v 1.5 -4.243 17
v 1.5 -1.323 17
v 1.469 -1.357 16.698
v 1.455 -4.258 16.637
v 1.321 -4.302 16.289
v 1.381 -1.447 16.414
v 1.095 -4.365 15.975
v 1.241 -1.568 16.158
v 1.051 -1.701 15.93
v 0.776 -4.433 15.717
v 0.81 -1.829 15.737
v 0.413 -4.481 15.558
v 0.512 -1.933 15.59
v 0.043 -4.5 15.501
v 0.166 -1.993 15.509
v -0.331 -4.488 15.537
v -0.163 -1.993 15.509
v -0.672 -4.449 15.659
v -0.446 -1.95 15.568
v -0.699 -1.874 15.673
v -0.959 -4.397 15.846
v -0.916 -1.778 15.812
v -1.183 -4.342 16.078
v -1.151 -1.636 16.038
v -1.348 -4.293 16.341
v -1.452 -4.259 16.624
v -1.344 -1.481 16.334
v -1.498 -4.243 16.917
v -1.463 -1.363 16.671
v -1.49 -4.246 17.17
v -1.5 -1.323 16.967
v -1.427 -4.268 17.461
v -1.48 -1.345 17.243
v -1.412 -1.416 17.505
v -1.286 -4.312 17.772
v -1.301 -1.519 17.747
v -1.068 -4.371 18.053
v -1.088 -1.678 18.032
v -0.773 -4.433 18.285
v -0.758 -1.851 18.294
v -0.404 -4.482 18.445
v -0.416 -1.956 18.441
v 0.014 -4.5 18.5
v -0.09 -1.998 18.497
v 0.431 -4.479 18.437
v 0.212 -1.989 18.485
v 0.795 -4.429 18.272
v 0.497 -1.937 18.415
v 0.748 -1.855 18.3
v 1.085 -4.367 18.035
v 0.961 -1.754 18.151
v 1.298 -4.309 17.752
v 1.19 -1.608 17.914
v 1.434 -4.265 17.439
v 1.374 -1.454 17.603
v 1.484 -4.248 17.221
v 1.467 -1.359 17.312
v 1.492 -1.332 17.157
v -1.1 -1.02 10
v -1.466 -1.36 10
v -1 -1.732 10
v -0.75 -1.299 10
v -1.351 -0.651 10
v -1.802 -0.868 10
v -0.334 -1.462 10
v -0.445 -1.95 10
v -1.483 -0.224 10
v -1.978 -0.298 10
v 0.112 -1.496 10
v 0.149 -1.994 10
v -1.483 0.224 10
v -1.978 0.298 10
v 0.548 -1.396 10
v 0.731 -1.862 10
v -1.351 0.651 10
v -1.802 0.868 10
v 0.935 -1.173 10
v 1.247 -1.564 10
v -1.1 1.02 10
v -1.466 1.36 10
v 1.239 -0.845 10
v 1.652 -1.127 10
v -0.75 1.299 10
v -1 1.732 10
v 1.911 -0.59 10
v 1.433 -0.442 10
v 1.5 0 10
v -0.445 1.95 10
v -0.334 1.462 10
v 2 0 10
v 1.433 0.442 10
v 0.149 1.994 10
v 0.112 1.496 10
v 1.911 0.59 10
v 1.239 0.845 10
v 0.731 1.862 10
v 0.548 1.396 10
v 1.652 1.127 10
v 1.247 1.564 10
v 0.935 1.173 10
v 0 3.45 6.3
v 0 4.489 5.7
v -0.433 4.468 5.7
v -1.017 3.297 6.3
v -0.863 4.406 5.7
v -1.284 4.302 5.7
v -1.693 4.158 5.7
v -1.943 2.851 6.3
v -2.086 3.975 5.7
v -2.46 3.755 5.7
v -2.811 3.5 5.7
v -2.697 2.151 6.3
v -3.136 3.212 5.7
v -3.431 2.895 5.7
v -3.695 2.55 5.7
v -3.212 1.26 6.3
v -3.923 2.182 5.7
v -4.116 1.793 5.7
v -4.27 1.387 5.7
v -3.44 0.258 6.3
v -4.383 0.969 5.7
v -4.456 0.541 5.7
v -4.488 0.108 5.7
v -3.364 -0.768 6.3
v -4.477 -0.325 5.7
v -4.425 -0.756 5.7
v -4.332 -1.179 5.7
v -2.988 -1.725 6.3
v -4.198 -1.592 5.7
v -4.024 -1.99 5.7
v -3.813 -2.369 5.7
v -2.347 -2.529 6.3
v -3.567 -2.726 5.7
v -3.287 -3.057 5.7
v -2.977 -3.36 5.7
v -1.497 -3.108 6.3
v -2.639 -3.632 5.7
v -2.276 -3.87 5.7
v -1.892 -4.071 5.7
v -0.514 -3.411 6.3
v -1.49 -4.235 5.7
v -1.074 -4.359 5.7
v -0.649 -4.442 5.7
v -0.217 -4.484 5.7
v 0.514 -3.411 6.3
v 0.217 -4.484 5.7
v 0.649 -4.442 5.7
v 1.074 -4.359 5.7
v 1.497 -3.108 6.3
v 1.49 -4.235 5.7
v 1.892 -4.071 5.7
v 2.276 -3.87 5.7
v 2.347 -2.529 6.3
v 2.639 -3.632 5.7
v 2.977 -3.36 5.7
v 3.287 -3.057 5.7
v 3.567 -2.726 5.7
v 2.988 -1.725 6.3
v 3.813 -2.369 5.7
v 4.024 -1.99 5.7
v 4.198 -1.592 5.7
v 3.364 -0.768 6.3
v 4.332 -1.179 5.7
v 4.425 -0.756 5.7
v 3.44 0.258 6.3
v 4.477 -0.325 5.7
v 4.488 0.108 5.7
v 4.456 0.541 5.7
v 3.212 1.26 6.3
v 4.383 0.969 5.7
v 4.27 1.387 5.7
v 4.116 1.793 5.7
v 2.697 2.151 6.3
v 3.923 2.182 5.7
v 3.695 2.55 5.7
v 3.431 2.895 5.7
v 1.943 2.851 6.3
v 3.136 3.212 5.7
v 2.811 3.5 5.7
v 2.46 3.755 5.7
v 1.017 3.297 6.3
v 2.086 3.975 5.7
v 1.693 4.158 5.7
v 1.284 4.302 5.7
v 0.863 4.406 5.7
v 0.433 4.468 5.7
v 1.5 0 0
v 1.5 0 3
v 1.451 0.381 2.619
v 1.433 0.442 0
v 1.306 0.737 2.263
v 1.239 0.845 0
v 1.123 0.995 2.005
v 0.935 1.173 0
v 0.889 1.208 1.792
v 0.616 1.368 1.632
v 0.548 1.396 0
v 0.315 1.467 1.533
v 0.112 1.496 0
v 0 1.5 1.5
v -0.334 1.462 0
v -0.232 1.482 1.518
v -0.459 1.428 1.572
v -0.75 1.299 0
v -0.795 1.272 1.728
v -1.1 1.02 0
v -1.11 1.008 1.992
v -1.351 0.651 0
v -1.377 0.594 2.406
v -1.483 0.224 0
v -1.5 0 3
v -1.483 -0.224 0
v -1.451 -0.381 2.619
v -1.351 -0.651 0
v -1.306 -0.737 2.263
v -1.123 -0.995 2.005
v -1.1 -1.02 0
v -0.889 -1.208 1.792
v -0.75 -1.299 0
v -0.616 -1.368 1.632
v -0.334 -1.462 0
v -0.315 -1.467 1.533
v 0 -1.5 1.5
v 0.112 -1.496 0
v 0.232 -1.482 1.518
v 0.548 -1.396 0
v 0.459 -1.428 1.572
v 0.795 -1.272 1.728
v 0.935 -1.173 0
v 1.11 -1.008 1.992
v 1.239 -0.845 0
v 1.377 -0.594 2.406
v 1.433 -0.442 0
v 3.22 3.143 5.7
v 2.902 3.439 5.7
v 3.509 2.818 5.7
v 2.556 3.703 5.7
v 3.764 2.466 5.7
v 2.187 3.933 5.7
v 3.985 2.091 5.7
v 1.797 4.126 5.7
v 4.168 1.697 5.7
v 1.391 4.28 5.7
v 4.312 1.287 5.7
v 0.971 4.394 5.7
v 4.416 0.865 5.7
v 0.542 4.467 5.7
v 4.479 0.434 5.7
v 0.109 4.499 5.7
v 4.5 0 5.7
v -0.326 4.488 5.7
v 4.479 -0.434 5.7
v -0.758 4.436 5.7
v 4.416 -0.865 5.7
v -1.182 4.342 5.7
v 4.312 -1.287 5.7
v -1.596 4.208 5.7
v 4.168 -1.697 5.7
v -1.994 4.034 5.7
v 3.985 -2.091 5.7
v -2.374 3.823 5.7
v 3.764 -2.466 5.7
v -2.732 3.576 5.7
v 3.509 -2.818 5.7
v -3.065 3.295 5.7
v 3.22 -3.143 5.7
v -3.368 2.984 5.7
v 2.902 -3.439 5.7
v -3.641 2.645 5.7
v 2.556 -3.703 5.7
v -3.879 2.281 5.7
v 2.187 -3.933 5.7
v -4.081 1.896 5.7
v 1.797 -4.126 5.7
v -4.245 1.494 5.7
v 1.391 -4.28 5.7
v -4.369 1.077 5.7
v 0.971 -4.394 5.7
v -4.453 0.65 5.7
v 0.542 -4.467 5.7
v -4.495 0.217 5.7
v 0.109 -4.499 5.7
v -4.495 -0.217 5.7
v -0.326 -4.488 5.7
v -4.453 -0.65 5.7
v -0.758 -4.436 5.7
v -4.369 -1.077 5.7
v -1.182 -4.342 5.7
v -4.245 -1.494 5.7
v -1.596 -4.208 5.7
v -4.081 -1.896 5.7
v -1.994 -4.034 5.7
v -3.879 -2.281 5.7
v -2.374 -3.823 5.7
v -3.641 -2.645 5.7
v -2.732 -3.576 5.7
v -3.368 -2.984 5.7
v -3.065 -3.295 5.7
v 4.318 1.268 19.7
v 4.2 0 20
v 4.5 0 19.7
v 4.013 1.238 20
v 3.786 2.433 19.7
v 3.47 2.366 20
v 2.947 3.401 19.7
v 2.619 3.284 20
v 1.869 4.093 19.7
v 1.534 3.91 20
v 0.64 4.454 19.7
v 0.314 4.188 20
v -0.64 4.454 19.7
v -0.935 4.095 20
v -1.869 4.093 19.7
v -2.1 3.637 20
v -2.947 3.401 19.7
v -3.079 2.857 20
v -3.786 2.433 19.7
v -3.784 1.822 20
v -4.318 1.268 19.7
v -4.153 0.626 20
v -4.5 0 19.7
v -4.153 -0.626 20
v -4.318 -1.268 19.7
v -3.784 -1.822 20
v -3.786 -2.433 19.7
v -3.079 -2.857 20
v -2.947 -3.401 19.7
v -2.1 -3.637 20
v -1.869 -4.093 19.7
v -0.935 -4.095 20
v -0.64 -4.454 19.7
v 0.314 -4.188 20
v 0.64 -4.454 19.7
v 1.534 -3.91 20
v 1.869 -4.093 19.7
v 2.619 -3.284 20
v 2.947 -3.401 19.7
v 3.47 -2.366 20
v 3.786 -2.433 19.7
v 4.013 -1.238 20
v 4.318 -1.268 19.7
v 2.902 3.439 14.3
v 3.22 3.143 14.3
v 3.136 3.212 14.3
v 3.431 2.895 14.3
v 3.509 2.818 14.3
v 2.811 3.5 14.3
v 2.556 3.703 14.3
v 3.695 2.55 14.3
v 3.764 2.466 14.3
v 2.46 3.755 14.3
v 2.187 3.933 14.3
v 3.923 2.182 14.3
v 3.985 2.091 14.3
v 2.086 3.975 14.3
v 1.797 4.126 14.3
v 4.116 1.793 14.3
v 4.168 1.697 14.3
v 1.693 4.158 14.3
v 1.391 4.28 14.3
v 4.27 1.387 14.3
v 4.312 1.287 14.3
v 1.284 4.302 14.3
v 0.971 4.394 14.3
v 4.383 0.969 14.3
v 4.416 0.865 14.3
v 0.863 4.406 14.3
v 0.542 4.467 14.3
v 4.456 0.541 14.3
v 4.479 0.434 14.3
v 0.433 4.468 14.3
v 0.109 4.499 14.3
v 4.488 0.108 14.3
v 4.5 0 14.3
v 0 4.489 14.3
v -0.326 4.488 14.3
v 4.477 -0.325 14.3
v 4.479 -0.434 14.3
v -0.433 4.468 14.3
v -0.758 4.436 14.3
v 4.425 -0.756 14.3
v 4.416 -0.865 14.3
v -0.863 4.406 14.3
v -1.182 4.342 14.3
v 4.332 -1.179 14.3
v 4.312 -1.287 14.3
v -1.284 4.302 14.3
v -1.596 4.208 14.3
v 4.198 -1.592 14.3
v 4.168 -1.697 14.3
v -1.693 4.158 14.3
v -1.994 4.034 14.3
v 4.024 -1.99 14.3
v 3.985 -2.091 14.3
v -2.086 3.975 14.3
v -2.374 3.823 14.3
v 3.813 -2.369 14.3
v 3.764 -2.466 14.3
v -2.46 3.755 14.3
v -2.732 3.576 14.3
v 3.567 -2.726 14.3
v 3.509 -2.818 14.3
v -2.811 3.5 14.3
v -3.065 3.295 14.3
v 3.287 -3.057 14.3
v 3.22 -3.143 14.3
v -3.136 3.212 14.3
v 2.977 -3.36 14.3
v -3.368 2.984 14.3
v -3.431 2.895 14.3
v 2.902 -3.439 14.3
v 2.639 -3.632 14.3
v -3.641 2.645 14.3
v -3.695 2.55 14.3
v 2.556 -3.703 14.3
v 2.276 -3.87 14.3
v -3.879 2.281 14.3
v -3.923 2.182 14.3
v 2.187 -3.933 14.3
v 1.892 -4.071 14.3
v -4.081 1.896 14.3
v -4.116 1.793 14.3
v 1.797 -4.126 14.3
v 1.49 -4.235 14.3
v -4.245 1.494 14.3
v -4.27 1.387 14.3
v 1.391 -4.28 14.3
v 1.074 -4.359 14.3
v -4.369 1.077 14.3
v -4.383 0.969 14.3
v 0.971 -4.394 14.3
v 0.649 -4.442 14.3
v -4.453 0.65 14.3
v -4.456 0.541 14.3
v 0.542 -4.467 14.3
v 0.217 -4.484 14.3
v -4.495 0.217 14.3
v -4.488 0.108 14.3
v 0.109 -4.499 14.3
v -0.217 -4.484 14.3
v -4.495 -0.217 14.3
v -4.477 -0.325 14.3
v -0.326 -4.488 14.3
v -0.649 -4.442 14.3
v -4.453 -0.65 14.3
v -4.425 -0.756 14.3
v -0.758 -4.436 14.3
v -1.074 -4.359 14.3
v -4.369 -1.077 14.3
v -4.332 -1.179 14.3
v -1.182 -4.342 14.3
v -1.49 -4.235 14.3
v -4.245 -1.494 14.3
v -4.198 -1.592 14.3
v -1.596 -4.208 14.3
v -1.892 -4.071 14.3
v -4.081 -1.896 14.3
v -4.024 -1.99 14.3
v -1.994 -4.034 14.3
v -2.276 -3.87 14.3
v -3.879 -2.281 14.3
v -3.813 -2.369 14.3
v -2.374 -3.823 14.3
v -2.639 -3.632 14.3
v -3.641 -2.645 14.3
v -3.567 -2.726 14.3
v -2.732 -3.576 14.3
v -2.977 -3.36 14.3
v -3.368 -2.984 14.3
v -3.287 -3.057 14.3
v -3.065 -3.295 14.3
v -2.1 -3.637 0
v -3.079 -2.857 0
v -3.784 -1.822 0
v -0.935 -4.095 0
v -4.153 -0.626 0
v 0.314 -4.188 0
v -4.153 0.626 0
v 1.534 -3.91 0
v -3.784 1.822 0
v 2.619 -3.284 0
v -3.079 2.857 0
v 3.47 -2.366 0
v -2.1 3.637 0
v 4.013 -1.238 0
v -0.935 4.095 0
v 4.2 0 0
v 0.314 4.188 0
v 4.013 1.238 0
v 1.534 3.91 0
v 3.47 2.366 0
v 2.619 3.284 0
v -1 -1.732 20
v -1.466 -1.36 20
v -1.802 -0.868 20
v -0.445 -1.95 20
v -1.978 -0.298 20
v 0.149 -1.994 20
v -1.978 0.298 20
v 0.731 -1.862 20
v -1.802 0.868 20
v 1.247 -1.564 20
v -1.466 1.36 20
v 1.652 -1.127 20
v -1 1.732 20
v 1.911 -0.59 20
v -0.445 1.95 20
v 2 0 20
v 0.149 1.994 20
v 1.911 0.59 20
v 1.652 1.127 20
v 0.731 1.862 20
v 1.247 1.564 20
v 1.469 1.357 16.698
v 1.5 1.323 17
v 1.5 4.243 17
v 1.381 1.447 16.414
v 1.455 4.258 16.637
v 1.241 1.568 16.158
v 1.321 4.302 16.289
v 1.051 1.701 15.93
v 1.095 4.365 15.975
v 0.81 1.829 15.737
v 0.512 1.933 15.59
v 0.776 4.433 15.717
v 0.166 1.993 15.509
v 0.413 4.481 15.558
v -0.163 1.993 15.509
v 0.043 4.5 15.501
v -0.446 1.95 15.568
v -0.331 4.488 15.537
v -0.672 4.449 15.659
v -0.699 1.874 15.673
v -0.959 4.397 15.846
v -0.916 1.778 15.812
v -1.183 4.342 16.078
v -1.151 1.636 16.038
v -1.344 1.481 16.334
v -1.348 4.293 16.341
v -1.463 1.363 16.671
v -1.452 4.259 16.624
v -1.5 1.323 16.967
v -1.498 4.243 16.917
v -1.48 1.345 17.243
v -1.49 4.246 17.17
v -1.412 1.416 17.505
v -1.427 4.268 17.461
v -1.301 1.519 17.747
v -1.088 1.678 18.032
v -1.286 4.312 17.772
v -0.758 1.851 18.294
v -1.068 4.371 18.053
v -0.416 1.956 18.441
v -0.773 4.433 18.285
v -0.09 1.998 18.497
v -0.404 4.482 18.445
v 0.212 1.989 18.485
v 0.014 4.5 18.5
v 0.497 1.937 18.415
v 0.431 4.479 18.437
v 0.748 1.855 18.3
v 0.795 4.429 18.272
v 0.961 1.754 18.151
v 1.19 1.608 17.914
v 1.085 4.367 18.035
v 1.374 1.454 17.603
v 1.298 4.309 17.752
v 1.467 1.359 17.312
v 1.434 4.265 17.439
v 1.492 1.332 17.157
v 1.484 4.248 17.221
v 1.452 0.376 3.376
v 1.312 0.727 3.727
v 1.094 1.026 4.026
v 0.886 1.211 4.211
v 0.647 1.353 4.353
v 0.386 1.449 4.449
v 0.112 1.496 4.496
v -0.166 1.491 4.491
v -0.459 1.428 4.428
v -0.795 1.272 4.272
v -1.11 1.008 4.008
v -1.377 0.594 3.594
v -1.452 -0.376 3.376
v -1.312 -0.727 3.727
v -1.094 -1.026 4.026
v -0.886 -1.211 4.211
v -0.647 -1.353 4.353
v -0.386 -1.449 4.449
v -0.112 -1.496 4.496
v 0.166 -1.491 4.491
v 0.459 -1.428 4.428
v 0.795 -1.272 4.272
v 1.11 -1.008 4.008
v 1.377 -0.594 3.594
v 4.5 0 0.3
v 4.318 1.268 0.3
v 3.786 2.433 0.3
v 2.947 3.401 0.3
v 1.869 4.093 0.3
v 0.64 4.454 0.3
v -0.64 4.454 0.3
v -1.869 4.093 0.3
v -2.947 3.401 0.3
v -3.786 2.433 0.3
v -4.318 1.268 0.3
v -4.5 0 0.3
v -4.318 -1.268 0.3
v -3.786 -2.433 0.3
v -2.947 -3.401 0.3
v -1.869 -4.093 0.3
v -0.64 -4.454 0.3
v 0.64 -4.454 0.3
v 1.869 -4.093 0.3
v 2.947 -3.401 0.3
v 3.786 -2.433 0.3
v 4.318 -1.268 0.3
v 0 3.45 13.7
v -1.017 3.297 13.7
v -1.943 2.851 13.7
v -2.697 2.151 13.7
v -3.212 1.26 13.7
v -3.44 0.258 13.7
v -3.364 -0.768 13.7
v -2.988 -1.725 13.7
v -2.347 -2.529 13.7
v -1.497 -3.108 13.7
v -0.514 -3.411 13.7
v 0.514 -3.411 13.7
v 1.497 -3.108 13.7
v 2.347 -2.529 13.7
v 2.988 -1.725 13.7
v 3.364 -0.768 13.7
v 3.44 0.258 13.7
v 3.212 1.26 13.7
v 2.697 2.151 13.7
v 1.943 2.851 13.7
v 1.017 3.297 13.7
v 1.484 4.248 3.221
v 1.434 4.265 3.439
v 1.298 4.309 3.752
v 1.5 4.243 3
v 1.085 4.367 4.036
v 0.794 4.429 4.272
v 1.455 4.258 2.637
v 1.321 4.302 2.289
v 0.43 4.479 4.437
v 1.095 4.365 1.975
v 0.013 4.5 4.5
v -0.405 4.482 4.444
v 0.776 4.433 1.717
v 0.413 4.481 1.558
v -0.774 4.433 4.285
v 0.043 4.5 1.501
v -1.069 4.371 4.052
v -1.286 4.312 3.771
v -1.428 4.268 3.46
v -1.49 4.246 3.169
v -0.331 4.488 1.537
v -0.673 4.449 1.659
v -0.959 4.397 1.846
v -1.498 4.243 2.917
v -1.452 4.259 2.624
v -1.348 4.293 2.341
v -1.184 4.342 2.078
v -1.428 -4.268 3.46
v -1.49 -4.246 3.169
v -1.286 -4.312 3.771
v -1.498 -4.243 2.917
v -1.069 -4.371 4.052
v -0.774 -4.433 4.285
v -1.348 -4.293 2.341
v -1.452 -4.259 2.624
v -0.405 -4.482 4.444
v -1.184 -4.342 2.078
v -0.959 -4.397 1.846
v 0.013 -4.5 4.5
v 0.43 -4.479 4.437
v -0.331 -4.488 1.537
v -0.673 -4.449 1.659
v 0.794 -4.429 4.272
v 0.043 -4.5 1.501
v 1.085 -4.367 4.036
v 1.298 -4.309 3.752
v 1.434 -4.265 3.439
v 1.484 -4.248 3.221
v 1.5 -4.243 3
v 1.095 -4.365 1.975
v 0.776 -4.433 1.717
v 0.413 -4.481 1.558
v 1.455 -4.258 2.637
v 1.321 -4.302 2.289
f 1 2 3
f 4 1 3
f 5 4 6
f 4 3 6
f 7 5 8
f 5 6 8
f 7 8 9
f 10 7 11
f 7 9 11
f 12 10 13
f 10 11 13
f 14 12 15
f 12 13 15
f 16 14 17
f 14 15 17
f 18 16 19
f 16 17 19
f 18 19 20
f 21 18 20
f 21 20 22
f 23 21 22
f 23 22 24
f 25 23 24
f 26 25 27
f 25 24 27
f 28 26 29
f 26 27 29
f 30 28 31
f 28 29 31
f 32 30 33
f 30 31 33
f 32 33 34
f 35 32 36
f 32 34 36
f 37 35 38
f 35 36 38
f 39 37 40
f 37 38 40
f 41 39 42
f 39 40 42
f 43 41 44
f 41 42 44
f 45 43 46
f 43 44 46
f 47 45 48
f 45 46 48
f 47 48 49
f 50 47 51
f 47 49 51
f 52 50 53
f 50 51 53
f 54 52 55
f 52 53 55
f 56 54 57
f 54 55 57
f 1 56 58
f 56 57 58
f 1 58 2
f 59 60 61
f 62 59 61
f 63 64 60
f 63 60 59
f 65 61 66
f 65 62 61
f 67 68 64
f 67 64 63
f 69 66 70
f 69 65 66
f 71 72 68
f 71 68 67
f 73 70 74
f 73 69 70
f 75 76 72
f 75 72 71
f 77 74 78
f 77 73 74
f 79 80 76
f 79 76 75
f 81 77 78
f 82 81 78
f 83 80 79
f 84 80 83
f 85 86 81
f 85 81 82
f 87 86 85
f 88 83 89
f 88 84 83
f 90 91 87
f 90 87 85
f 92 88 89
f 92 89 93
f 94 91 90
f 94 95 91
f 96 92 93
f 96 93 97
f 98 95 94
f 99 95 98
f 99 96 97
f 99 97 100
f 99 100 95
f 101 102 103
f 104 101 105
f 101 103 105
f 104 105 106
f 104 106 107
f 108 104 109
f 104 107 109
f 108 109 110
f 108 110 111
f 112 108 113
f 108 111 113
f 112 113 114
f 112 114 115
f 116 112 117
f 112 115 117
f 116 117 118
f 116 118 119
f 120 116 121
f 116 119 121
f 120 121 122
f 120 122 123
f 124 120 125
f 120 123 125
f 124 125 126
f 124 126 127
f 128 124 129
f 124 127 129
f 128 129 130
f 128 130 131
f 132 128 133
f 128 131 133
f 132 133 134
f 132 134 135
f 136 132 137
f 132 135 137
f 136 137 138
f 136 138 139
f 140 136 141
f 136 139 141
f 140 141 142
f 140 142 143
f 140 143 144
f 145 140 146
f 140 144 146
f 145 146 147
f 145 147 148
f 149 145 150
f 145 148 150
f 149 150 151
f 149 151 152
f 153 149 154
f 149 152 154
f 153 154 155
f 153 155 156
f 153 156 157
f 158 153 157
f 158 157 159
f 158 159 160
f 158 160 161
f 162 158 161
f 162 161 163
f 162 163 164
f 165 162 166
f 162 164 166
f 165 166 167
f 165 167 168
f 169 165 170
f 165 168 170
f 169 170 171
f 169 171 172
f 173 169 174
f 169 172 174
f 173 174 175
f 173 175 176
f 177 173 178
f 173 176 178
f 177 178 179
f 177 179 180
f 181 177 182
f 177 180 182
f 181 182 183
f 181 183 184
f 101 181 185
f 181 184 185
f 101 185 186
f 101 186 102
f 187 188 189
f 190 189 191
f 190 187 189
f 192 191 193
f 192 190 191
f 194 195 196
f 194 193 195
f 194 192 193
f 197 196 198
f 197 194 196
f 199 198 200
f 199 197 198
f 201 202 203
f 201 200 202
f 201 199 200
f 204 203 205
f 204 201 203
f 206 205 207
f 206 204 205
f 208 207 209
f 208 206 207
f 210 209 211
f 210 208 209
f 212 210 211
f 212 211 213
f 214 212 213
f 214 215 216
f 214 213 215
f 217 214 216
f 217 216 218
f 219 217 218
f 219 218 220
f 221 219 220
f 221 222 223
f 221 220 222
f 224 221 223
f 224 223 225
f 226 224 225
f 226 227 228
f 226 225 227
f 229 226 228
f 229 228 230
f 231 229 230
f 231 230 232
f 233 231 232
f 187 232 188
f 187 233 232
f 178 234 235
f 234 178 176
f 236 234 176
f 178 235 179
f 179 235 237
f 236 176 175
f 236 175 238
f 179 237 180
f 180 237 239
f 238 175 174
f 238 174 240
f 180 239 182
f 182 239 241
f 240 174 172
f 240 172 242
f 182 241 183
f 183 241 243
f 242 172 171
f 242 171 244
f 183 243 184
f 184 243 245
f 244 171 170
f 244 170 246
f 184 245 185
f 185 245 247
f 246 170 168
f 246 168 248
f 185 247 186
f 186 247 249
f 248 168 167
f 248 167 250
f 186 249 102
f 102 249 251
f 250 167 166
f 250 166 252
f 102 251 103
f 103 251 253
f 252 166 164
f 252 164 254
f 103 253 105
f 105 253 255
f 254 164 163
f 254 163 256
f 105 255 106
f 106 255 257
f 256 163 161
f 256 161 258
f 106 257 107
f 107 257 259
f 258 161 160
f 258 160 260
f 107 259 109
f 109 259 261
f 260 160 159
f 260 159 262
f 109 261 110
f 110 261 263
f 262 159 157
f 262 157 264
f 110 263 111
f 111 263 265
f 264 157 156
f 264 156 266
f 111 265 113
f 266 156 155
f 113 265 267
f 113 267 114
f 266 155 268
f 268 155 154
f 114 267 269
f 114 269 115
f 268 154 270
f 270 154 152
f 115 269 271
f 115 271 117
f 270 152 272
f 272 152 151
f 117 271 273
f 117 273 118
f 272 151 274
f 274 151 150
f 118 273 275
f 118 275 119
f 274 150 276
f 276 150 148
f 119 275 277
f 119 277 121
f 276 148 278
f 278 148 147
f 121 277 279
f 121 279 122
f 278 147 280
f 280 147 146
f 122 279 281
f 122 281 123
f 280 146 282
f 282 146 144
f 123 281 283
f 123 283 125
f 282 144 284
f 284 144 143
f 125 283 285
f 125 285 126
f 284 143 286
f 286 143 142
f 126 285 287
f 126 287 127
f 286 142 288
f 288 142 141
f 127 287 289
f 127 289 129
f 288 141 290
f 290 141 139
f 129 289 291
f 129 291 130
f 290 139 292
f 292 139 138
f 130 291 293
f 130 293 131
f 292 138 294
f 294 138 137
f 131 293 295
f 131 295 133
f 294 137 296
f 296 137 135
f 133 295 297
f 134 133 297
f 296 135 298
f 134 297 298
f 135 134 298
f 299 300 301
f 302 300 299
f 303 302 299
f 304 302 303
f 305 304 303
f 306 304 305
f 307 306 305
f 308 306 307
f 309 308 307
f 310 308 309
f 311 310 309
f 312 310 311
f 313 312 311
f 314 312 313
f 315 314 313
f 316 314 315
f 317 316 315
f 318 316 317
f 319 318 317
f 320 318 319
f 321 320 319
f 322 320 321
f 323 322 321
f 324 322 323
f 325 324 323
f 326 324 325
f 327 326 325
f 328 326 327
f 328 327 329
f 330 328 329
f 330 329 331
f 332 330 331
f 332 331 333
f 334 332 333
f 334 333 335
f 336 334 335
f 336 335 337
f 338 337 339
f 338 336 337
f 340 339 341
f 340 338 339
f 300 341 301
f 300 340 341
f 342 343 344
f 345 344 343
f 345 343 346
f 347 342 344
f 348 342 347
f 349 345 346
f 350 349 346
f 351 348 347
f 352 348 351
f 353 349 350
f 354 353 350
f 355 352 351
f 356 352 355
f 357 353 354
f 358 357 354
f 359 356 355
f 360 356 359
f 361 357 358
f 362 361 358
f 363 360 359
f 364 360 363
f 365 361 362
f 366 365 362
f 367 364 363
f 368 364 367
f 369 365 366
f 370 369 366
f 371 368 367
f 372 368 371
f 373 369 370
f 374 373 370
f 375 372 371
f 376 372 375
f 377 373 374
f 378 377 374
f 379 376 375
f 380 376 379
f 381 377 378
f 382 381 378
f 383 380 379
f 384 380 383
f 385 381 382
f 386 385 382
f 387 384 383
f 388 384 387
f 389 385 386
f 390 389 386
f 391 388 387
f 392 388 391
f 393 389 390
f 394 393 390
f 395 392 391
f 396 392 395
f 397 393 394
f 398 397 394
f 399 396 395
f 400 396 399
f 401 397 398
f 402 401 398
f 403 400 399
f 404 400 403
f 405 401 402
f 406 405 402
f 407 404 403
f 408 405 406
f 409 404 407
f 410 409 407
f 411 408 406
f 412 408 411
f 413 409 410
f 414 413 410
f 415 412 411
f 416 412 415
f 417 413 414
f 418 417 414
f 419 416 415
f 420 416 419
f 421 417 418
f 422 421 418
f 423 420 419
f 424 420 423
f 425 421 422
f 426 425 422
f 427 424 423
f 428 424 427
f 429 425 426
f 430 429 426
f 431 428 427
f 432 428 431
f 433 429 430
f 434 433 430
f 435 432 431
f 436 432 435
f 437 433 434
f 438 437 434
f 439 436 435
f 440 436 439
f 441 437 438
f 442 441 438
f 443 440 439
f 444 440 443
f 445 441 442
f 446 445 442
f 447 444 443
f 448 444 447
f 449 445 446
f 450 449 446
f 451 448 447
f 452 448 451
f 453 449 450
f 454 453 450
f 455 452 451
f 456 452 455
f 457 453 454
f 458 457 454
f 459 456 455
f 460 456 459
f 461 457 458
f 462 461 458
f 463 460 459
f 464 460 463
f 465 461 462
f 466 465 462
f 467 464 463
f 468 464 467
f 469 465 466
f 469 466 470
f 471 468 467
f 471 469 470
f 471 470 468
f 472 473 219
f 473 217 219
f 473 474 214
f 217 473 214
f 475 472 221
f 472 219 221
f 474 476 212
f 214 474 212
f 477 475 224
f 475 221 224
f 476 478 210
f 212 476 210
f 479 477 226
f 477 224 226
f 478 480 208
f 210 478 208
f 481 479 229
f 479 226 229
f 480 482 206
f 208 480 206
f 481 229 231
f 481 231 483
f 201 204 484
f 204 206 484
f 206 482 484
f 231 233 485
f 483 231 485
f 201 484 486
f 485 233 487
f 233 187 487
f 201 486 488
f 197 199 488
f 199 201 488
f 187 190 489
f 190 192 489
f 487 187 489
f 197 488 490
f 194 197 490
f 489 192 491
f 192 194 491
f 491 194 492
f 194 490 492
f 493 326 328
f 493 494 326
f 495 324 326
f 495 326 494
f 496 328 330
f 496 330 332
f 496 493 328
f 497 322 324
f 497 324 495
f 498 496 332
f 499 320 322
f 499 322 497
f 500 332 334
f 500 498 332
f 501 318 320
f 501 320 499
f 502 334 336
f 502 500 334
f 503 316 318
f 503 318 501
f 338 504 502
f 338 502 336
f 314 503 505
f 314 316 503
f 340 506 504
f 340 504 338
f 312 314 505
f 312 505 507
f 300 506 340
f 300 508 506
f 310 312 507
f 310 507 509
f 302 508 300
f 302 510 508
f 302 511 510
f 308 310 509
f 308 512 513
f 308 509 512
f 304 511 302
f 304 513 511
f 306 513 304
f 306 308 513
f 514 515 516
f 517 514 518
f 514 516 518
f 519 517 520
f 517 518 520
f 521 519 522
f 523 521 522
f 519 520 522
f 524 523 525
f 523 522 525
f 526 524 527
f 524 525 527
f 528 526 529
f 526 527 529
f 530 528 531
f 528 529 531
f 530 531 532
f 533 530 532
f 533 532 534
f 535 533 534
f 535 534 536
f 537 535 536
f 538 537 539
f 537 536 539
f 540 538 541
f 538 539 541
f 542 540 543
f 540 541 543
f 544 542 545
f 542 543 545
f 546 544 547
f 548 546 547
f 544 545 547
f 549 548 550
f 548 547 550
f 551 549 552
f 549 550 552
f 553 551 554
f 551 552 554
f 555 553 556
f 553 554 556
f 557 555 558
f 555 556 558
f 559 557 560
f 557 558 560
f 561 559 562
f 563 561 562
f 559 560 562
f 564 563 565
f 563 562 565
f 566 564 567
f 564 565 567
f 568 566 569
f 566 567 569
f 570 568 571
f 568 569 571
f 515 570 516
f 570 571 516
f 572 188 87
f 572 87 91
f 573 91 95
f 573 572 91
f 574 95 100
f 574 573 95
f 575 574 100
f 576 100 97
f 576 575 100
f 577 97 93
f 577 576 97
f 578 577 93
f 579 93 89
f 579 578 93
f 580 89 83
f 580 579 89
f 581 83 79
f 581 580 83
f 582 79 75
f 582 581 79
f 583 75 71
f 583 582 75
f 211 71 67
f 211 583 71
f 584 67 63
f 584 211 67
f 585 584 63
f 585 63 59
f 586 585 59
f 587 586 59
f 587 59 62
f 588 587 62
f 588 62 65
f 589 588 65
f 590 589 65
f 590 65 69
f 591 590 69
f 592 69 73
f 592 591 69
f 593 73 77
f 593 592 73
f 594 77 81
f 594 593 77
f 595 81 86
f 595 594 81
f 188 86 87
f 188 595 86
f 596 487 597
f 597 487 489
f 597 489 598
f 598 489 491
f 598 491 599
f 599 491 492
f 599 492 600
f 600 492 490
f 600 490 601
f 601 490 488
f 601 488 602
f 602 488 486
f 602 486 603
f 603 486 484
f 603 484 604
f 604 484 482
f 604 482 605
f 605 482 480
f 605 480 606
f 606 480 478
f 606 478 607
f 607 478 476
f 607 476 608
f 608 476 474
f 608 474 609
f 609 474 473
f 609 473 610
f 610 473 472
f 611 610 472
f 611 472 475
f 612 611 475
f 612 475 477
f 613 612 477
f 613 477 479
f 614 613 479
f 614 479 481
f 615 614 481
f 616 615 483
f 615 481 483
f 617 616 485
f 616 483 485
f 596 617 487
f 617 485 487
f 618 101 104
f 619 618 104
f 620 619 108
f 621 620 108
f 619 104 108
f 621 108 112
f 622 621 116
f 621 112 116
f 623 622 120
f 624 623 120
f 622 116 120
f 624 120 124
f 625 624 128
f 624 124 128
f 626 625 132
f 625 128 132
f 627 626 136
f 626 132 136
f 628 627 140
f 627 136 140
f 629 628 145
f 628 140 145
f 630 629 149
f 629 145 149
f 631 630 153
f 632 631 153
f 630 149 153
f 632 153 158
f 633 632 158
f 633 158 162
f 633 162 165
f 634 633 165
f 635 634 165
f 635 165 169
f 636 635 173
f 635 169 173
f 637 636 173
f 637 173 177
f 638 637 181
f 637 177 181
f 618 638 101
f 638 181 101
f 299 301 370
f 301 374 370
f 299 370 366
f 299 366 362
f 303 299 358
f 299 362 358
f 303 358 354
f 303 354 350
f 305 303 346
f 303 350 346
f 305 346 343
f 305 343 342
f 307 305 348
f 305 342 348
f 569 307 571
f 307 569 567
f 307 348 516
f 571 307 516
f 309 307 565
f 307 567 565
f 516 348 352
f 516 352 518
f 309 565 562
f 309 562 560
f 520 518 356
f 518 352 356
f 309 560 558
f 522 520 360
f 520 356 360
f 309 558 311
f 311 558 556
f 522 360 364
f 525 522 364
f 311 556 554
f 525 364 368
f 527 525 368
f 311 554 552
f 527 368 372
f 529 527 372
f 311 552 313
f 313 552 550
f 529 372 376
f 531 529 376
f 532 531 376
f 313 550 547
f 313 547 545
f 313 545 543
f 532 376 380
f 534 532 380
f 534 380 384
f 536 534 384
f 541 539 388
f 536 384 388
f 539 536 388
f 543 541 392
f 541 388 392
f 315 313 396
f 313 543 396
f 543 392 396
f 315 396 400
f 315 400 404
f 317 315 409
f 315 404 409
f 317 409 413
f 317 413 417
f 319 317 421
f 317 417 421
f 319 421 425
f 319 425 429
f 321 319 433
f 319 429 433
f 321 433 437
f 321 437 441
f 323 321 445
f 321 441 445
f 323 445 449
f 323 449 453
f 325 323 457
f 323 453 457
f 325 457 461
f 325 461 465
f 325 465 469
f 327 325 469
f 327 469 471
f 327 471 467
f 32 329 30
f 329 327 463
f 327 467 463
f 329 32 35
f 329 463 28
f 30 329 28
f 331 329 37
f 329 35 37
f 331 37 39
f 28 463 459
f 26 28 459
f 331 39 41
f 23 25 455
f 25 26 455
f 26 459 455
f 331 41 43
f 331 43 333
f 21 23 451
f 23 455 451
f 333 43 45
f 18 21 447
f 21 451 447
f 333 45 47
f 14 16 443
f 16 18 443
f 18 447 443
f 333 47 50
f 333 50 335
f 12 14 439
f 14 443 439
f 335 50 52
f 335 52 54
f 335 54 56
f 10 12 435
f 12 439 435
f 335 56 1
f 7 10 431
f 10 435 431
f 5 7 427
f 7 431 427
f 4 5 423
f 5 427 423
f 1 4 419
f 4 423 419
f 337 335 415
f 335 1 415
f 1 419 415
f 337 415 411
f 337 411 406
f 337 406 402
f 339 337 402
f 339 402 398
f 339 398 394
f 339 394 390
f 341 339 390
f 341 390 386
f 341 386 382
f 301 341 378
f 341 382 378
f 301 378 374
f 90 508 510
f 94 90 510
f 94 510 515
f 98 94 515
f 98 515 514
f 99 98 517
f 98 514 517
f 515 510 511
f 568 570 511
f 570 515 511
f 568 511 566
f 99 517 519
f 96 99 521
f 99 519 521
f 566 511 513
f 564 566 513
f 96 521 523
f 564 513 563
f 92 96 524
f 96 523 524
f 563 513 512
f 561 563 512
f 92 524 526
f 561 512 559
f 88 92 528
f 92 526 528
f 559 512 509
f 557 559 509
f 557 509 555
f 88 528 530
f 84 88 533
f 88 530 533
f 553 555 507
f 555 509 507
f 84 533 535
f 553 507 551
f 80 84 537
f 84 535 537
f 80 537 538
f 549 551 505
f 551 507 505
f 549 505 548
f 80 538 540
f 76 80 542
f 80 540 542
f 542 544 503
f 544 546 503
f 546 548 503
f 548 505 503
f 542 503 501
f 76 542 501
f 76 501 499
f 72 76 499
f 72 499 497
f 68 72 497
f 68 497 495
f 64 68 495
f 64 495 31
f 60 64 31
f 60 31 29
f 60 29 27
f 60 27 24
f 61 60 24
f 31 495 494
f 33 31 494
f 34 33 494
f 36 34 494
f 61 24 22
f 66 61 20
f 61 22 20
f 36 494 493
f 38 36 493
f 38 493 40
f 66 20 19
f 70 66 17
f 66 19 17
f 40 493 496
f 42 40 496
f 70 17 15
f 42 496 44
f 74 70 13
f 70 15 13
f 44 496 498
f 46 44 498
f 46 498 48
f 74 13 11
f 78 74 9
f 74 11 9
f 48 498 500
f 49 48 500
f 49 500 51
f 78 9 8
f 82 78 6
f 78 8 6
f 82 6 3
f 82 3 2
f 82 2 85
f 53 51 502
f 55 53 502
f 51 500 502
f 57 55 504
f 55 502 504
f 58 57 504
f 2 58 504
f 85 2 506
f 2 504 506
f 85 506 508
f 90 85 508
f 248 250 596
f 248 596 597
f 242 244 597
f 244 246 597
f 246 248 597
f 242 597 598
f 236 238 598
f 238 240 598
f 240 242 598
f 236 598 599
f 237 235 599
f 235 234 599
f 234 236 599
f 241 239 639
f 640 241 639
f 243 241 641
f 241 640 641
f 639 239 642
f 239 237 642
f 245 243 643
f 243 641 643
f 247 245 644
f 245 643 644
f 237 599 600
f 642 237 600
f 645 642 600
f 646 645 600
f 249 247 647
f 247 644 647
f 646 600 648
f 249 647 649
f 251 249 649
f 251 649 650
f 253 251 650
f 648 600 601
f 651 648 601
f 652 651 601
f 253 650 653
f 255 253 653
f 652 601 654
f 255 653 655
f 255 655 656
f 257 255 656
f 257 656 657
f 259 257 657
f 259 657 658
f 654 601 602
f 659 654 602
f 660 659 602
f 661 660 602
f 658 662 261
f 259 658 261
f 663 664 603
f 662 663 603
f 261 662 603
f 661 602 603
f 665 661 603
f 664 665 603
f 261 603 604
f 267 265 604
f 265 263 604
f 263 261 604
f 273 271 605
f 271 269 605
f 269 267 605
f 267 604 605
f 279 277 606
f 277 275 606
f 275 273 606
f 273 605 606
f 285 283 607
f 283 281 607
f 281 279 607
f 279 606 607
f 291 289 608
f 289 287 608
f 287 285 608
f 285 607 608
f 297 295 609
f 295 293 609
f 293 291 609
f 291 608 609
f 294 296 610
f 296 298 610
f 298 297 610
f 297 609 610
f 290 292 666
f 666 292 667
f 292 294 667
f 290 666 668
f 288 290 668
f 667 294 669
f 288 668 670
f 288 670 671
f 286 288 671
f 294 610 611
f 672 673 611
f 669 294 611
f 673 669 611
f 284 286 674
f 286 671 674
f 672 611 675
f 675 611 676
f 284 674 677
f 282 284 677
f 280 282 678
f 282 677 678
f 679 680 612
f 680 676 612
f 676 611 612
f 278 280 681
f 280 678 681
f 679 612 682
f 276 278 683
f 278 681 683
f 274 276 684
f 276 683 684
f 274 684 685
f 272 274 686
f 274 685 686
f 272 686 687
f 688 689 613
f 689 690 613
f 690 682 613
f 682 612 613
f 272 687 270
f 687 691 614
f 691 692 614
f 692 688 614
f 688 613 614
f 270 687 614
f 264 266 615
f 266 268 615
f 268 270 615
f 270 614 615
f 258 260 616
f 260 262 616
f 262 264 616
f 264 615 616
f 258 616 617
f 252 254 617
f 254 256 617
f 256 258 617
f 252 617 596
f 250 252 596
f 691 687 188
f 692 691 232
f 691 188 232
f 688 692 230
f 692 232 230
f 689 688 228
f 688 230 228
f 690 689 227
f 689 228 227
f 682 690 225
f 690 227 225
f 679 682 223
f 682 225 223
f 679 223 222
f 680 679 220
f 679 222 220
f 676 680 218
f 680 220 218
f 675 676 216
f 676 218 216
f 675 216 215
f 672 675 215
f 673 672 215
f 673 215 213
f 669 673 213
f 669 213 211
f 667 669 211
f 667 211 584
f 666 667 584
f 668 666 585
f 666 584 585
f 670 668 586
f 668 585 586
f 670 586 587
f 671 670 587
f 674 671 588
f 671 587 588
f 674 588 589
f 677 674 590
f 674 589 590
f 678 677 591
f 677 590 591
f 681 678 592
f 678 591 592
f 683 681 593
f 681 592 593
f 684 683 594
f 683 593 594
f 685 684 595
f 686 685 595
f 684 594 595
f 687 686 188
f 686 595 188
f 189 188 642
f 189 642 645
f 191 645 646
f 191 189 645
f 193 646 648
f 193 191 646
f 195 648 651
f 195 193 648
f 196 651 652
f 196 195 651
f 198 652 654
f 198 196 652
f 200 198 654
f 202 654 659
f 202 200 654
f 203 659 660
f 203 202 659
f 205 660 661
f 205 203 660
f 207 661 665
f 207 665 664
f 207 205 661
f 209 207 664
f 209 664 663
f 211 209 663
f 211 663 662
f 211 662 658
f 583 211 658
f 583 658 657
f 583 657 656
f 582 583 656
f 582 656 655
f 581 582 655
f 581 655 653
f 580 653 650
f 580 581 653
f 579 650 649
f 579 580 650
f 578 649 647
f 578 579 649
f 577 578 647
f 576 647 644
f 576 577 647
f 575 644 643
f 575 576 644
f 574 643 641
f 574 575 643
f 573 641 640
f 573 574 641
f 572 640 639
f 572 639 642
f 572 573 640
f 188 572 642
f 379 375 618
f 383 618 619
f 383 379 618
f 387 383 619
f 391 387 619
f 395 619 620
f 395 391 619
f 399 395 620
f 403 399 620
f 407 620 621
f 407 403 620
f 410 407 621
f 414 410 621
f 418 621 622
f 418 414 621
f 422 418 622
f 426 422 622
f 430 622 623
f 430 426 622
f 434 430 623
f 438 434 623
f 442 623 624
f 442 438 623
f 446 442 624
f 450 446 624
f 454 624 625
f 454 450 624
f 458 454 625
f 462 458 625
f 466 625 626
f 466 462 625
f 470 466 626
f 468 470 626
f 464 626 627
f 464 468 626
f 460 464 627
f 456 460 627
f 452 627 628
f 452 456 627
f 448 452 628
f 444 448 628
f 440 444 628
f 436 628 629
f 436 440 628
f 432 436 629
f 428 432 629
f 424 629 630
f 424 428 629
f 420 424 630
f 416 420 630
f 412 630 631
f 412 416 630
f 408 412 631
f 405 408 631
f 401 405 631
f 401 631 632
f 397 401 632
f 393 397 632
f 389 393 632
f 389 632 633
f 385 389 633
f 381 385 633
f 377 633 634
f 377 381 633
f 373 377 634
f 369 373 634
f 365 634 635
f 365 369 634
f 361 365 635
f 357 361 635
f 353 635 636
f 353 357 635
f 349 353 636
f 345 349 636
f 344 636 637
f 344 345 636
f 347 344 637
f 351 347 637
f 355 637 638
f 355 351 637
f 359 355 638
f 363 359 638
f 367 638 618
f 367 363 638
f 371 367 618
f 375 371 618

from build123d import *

# Parameters (mm, degrees)
SKICA8_R                 = 4.5
SKICA8_R_2               = 1.5
P_IDAT_VYSUNUT_M8_DEPTH  = 20
SKICA9_W                 = 8.6
SKICA9_H                 = 1.884529933
ZKOSEN_1_SIZE            = 0.6
ZKOSEN_1_SIZE2           = 1.039230485
ZKOSEN_2_SIZE            = 0.6
ZKOSEN_2_SIZE2           = 1.039230485
ZKOSEN_3_SIZE            = 0.3
SKICA10_R                = 1.5
ODEBRAT_VYSUNUT_M1_DEPTH = 10
SKICA11_R                = 2
ODEBRAT_VYSUNUT_M2_DEPTH = 10


with BuildPart() as part:
    # Skica8 → Přidat vysunutím8 (new body)
    with BuildSketch(Plane(origin=(23.8, 0, 0), x_dir=(1, 0, 0), z_dir=(0, 0, 1))):
        with Locations((-23.8, 0)):
            Circle(SKICA8_R)
        with Locations((-23.8, 0)):
            Circle(SKICA8_R_2, mode=Mode.SUBTRACT)
    extrude(amount=P_IDAT_VYSUNUT_M8_DEPTH)

    # Skica9 → Odebrat rotací1 (revolve, cut)
    with BuildSketch(Plane(origin=(0, 0, 0), x_dir=(0, 0, -1), z_dir=(1, 0, 0))):
        with Locations((-10, 4.392264967)):
            Rectangle(SKICA9_W, SKICA9_H)
    revolve(axis=Axis((0, 0, 0), (0, 0, 1)), mode=Mode.SUBTRACT)

    # Zkosení1
    zkosen_1_edges = [part.edges().sort_by_distance(p)[0] for p in [
        (0, -3.45, 5.7),
    ]]
    zkosen_1_side = [part.faces().sort_by_distance(p)[0] for p in [
        (0, -3.45, 10),
    ]]
    chamfer(zkosen_1_edges, length=ZKOSEN_1_SIZE, length2=ZKOSEN_1_SIZE2, reference=zkosen_1_side[0])

    # Zkosení2
    zkosen_2_edges = [part.edges().sort_by_distance(p)[0] for p in [
        (0, -3.45, 14.3),
    ]]
    zkosen_2_side = [part.faces().sort_by_distance(p)[0] for p in [
        (0, -3.45, 10.3),
    ]]
    chamfer(zkosen_2_edges, length=ZKOSEN_2_SIZE, length2=ZKOSEN_2_SIZE2, reference=zkosen_2_side[0])

    # Zkosení3
    zkosen_3_edges = [part.edges().sort_by_distance(p)[0] for p in [
        (-4.5, 0, 0),
        (-4.5, 0, 20),
    ]]
    chamfer(zkosen_3_edges, length=ZKOSEN_3_SIZE)

    # Skica10 → Odebrat vysunutím1 (cut, symmetric)
    with BuildSketch(Plane(origin=(0, 0, 0), x_dir=(1, 0, 0), z_dir=(0, 1, 0))):
        with Locations((0, -3)):
            Circle(SKICA10_R)
        with Locations((0, -17)):
            Circle(SKICA10_R)
    extrude(amount=ODEBRAT_VYSUNUT_M1_DEPTH, both=True, mode=Mode.SUBTRACT)

    # Skica11 → Odebrat vysunutím2 (cut)
    with BuildSketch(Plane.XY.offset(20)):
        Circle(SKICA11_R)
    extrude(amount=-ODEBRAT_VYSUNUT_M2_DEPTH, mode=Mode.SUBTRACT)


solid = part.part
